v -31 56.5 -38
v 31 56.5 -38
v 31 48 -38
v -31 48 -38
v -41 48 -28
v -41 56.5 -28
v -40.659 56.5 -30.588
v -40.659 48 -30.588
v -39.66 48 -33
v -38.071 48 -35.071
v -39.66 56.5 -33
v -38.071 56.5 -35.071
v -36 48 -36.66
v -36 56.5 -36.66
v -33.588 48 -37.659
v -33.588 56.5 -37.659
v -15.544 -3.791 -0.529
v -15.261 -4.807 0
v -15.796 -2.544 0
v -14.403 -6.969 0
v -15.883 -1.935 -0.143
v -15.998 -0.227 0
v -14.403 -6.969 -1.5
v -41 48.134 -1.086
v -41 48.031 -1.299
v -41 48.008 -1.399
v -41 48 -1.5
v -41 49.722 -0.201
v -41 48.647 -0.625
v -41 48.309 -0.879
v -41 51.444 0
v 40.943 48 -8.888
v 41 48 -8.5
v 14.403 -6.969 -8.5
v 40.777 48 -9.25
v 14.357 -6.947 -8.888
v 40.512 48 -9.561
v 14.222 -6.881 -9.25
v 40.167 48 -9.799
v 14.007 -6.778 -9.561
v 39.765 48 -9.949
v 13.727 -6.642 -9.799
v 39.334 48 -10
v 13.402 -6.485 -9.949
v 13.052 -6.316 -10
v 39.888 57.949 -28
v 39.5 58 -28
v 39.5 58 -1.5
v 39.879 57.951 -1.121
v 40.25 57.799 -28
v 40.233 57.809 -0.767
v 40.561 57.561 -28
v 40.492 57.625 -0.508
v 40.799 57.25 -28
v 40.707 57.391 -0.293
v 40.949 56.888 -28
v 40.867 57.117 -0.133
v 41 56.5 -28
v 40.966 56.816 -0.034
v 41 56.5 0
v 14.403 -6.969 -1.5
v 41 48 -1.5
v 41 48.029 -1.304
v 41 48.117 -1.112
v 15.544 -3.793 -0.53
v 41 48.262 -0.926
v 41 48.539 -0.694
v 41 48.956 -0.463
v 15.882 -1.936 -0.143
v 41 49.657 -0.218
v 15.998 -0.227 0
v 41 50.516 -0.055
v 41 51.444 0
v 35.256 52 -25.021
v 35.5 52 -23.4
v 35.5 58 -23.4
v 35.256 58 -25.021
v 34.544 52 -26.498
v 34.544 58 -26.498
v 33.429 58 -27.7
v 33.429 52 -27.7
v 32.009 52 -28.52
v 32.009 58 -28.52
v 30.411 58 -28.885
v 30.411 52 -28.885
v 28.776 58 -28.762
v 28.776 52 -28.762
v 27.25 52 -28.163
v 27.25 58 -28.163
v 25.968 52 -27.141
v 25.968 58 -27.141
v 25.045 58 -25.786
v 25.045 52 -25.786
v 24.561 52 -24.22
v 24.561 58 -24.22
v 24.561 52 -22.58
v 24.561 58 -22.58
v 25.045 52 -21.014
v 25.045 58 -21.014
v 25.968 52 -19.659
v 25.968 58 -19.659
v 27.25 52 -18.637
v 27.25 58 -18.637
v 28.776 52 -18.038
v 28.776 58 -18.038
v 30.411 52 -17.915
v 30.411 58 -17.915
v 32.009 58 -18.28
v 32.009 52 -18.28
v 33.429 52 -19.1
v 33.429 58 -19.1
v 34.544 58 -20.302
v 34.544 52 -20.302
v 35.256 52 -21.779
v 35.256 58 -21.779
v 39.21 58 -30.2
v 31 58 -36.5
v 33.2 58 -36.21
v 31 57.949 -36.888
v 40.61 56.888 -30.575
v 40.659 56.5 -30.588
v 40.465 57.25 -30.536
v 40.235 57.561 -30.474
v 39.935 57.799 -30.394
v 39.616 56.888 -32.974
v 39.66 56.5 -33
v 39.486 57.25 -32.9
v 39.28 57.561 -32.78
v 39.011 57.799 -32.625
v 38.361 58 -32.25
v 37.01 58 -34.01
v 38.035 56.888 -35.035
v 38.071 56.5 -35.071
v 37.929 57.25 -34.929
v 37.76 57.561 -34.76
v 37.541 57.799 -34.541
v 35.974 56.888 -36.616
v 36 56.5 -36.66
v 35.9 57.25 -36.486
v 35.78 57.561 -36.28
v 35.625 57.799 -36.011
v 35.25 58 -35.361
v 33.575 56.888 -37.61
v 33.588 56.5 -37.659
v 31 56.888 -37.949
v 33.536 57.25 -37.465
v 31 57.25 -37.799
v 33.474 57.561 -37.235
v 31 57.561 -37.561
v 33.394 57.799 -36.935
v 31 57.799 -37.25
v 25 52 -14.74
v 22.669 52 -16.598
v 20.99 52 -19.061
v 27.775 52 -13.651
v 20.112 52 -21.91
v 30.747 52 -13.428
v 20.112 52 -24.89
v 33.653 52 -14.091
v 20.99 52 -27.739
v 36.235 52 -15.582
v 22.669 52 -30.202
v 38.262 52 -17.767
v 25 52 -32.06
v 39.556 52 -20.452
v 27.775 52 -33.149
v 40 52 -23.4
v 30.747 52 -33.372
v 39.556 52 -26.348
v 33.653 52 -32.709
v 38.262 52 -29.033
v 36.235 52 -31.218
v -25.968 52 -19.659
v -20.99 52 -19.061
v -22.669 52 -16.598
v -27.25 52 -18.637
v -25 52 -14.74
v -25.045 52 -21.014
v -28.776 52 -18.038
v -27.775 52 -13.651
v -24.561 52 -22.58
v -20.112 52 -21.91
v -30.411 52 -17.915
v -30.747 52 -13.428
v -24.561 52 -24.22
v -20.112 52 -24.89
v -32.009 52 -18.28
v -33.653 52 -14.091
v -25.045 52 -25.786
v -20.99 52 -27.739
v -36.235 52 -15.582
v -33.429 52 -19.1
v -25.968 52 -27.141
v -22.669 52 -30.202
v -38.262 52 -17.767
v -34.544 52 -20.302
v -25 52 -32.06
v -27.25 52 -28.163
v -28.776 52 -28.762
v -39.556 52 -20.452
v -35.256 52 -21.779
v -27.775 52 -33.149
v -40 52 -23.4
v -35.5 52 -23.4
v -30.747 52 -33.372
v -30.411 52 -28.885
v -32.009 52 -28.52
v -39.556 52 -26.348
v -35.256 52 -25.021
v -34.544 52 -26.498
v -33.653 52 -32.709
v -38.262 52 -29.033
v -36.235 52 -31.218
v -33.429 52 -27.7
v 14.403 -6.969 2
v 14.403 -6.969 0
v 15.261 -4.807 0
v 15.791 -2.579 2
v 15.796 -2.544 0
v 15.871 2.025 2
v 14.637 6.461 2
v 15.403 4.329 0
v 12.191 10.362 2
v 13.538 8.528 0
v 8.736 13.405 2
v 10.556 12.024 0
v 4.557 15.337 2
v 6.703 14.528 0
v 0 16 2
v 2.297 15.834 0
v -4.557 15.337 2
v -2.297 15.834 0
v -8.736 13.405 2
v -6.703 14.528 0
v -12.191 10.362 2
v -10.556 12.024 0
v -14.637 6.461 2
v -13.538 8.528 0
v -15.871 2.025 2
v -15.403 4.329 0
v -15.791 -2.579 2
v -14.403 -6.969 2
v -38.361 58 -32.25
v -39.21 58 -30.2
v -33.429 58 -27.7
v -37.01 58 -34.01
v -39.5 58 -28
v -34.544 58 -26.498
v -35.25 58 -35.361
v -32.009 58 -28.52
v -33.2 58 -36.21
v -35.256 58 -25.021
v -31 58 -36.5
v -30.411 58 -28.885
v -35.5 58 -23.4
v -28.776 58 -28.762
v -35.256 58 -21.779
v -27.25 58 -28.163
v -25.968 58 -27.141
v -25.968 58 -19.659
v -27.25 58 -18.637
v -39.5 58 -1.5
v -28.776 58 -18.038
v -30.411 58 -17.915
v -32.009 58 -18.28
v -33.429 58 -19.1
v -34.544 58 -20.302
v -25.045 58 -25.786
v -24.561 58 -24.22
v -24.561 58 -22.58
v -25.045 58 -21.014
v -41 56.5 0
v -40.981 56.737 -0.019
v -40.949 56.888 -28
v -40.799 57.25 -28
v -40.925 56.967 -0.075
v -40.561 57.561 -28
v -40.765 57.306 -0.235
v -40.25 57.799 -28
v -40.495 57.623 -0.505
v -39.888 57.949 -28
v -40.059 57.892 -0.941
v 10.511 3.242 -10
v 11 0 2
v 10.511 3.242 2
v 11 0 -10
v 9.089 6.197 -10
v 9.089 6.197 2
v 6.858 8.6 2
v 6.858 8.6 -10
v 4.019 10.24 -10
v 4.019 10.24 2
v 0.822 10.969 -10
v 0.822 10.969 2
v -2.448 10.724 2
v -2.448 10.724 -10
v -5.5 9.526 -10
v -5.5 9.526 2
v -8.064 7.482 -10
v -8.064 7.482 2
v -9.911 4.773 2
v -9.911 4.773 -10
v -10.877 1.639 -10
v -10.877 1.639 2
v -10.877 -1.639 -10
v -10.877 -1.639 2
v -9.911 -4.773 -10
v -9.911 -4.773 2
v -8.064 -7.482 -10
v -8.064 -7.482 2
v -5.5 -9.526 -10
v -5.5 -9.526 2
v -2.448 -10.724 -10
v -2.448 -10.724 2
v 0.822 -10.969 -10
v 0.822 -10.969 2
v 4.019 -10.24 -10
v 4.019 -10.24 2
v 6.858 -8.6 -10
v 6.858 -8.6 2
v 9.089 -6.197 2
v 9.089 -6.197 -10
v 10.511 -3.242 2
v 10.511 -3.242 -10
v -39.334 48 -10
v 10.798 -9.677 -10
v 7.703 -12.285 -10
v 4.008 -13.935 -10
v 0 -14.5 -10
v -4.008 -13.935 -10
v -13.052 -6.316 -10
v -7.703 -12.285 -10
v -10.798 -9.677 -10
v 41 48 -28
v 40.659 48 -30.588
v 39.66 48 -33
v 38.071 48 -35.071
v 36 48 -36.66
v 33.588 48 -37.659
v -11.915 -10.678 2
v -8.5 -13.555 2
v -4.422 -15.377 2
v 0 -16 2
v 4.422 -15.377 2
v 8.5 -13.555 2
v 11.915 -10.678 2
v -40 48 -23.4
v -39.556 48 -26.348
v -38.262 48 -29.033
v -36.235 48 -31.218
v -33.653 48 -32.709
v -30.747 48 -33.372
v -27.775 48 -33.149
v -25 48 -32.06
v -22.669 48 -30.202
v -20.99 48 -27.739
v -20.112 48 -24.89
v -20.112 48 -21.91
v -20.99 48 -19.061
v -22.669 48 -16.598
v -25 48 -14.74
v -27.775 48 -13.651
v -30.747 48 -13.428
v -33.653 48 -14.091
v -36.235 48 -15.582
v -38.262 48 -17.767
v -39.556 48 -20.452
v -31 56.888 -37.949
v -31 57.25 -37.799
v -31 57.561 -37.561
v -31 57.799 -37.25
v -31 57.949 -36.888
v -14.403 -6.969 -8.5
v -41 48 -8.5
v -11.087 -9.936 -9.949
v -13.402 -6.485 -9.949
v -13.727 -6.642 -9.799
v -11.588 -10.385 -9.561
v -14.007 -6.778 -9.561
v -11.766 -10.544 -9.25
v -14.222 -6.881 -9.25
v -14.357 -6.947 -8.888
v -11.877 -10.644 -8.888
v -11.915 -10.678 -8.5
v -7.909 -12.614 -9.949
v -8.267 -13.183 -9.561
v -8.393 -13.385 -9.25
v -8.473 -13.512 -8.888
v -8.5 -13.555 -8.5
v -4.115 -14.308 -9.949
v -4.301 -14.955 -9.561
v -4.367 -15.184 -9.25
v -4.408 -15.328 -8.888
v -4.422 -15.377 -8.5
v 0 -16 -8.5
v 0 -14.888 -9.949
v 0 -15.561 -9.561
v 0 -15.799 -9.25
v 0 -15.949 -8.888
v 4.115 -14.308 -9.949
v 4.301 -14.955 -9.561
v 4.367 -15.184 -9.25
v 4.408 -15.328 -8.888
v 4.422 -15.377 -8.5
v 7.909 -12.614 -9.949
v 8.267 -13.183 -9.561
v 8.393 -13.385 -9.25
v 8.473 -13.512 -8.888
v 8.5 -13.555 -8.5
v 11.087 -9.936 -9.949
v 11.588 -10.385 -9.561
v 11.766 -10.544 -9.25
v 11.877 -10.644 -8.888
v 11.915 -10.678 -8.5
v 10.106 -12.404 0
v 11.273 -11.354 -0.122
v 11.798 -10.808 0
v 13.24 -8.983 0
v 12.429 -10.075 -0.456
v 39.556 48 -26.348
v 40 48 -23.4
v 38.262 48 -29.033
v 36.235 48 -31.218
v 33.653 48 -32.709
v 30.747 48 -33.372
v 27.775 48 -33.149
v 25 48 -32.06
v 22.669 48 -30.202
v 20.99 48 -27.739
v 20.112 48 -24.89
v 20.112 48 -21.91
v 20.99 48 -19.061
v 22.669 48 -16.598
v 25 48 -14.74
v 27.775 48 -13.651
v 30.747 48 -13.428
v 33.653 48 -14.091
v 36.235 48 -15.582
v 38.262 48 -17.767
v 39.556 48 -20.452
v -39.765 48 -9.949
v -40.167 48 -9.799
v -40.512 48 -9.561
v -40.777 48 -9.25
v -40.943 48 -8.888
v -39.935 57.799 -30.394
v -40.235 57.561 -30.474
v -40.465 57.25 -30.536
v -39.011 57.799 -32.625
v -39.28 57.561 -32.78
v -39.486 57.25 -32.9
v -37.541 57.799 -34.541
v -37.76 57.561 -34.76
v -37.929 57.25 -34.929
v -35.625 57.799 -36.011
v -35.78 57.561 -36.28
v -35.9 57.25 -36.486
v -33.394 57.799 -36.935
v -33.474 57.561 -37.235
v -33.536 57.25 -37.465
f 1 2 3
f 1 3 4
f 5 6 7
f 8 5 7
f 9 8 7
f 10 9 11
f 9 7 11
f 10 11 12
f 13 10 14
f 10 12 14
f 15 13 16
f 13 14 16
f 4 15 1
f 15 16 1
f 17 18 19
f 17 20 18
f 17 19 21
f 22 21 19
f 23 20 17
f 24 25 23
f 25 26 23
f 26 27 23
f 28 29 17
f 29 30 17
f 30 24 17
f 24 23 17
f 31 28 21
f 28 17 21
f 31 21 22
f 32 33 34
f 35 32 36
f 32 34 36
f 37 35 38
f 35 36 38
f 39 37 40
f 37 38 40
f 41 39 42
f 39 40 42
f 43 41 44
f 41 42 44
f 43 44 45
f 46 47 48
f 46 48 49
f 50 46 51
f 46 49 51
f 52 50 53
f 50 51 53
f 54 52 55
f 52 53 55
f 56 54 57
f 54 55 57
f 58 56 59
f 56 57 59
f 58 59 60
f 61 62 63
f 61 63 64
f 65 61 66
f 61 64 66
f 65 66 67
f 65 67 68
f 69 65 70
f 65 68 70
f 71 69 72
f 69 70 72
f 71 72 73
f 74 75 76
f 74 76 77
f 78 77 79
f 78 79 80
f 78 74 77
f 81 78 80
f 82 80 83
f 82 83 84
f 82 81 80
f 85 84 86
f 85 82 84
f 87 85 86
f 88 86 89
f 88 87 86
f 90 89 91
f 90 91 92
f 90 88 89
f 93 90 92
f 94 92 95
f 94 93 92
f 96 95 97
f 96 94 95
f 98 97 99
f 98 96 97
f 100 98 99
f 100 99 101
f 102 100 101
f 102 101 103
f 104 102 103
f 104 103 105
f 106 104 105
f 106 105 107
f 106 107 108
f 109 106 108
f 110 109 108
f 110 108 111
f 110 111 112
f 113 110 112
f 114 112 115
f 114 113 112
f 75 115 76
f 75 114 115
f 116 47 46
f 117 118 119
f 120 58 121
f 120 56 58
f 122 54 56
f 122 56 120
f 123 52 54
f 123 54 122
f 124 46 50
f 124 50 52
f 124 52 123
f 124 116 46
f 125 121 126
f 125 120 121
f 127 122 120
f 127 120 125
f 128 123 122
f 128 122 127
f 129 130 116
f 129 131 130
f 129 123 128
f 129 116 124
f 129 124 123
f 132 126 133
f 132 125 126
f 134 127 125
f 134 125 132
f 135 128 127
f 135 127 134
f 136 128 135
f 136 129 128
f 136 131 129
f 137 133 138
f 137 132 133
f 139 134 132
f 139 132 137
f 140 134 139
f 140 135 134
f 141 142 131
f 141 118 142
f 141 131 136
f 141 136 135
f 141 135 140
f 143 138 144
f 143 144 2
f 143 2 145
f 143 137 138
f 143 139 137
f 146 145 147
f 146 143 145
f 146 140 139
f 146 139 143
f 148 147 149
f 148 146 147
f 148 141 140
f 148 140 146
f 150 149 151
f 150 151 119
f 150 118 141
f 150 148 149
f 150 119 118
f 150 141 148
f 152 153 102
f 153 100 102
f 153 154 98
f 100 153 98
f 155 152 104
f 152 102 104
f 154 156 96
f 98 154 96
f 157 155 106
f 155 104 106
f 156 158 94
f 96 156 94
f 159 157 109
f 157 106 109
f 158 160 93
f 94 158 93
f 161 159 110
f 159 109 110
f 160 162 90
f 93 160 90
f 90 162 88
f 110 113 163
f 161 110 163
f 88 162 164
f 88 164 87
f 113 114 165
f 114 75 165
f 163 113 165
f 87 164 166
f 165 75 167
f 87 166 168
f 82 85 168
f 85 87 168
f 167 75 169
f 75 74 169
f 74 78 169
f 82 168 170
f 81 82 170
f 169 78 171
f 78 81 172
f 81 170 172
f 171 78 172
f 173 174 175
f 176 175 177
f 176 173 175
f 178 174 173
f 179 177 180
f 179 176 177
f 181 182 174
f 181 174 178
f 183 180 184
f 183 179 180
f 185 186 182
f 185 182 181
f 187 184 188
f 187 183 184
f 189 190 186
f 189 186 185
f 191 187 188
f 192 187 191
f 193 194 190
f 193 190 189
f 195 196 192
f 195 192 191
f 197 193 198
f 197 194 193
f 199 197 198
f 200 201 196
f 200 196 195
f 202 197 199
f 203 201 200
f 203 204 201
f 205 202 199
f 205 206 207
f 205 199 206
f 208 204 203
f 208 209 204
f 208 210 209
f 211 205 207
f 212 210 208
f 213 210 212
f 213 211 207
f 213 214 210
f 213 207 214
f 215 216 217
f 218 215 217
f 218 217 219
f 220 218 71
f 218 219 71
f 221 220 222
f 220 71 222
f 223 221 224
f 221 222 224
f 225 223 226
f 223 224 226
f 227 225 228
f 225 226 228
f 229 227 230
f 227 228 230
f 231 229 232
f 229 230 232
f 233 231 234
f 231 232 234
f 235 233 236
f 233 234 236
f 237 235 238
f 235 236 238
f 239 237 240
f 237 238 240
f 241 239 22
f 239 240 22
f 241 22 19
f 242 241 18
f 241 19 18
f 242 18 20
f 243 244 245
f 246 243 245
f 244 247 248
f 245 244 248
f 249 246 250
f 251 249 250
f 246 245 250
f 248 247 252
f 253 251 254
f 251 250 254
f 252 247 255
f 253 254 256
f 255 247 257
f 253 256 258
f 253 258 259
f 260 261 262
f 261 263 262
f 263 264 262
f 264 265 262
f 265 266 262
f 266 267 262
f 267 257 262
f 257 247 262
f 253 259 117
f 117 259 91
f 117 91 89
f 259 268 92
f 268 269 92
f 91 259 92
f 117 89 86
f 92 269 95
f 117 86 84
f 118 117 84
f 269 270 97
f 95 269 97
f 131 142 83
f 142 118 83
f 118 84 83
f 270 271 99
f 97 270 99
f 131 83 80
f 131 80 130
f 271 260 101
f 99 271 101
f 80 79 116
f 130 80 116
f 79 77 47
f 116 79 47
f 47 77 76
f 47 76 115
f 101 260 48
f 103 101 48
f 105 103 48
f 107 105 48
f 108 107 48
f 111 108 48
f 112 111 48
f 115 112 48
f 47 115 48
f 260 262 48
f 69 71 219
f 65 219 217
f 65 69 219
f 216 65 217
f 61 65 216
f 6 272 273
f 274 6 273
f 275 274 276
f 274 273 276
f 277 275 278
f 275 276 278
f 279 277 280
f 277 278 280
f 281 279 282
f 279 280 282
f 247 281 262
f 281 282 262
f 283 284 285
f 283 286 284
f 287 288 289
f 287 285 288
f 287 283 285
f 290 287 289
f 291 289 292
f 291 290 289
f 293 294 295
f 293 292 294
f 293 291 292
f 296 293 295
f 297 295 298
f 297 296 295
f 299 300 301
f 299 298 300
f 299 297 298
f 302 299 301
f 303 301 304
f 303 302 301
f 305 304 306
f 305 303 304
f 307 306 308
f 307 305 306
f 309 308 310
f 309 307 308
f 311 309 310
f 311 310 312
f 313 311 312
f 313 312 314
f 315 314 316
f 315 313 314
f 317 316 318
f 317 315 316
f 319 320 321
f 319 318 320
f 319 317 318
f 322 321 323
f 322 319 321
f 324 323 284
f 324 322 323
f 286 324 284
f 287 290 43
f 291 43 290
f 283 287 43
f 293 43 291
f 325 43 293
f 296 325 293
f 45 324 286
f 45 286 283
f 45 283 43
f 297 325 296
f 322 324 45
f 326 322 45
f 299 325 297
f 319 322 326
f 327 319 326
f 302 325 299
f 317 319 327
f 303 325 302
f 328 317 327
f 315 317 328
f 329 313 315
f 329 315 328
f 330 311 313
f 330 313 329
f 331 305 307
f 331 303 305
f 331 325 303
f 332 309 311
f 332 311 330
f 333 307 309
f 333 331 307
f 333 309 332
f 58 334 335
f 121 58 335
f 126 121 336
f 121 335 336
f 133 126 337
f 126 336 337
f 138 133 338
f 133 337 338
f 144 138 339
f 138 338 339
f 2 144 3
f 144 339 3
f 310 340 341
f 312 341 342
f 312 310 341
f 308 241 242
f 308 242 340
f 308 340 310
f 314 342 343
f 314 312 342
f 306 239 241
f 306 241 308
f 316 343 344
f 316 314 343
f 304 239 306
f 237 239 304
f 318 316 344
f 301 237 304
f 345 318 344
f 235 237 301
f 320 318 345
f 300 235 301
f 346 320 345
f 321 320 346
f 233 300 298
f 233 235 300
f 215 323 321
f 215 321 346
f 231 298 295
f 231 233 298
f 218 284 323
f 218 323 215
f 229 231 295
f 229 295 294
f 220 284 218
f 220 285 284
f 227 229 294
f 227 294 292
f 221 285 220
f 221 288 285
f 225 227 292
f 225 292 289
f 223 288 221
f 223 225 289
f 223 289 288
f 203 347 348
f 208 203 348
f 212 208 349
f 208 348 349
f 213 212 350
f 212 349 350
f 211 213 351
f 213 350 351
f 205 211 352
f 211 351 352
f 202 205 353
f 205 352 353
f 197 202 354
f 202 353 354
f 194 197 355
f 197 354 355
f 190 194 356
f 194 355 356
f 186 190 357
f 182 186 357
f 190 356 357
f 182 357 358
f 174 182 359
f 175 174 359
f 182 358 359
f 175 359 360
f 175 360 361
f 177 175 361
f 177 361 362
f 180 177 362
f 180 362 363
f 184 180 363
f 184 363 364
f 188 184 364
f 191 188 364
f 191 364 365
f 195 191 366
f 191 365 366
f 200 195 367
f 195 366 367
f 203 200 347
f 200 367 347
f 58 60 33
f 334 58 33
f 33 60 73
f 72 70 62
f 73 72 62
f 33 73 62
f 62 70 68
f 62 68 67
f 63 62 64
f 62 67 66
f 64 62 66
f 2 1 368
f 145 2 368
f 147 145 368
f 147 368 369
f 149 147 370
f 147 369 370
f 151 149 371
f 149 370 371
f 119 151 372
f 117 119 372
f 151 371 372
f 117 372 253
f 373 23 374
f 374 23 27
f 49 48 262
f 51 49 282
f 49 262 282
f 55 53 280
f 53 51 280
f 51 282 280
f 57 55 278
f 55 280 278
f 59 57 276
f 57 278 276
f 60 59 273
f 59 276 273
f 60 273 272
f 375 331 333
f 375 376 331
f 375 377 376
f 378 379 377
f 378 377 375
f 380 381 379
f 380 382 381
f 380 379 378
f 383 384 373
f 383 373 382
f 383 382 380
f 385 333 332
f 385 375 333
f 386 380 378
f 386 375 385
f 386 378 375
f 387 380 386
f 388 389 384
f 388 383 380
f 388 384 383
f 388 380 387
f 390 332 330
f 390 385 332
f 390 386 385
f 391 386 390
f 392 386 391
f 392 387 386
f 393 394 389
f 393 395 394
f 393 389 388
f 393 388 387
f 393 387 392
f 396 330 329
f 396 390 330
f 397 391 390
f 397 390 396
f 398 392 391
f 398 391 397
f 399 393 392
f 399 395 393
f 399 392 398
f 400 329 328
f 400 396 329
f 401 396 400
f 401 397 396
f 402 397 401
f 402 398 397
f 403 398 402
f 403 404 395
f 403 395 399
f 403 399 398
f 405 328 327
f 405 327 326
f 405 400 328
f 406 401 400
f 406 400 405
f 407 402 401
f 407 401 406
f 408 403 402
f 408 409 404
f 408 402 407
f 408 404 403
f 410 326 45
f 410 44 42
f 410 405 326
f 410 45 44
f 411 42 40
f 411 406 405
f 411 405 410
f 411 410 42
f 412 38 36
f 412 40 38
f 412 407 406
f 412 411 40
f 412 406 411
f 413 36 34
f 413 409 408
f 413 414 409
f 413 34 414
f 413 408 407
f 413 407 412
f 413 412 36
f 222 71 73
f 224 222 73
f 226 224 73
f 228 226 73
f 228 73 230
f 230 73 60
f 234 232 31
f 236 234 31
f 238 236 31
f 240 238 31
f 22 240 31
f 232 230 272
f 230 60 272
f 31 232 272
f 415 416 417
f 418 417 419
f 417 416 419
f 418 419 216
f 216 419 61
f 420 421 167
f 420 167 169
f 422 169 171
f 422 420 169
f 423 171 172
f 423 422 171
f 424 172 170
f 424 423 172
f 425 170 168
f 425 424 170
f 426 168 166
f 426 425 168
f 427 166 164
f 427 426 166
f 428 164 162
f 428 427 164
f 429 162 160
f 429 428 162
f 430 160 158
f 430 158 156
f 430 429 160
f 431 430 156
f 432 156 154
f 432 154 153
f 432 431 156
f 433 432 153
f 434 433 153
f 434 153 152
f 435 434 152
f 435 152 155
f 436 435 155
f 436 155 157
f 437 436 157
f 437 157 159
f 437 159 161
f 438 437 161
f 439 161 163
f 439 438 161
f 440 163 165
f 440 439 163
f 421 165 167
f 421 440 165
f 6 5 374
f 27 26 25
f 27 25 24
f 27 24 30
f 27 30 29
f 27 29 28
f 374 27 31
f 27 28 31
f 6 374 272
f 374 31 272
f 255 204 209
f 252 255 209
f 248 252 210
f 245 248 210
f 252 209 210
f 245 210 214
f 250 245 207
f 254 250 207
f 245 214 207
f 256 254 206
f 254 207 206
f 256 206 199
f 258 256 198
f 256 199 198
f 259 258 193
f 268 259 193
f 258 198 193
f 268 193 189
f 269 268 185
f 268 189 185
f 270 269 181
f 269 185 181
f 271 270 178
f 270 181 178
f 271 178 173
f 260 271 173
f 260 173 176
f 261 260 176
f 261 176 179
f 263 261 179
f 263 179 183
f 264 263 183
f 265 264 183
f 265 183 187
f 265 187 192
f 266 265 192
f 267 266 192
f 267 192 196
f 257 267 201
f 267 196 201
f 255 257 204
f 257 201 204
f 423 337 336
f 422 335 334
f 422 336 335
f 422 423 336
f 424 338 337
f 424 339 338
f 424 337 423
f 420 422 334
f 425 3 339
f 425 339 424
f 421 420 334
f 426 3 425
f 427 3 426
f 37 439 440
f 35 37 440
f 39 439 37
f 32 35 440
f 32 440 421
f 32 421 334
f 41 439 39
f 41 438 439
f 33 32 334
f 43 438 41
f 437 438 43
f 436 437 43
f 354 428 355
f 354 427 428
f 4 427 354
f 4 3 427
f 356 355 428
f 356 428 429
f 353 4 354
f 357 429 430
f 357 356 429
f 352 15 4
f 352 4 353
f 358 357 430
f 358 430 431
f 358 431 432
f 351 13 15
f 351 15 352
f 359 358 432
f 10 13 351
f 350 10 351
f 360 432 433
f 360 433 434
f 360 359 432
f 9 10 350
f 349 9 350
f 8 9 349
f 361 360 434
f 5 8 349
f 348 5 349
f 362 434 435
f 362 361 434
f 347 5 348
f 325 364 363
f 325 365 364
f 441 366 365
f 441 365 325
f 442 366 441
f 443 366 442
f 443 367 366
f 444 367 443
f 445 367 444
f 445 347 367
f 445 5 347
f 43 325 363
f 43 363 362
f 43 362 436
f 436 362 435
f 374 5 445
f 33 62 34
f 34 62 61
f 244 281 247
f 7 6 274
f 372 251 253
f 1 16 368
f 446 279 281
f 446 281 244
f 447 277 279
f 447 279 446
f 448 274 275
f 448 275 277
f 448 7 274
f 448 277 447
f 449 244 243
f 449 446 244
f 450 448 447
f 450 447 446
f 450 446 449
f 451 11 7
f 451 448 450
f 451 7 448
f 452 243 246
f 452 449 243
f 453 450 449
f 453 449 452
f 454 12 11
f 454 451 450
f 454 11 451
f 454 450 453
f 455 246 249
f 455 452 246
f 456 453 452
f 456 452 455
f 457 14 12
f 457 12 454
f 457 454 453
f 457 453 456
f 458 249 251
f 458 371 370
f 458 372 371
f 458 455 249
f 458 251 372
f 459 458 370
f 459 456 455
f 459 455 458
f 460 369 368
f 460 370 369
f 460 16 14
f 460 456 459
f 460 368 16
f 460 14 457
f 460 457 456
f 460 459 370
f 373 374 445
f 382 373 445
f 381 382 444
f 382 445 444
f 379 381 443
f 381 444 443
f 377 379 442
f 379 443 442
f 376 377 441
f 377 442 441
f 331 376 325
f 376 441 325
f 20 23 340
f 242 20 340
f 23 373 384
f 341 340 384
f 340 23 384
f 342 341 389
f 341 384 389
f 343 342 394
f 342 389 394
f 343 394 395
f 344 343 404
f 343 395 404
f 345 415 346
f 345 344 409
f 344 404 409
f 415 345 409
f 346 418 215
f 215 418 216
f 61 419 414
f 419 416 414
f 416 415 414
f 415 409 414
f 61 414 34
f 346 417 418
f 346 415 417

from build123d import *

# Parameters (mm, degrees)
BASE_EXTRUDE_DEPTH      = 38
CUT_EXTRUDE1_DEPTH      = 81.554329493
CUT_EXTRUDE1_DEPTH_BACK = 41
HOLE2_OUTLINE_R         = 11
HOLE2_DEPTH             = 2
HOLE2_START             = -10
HOLE2_2_OUTLINE_R       = 11
HOLE2_2_DEPTH           = 10
HOLE2_START_2           = 48
HOLE2_3_OUTLINE_R       = 10
HOLE2_3_DEPTH           = 4
HOLE2_START_3           = 52
HOLE2_4_OUTLINE_R       = 5.5
HOLE2_4_DEPTH           = 6
FILLET1_R               = 10
FILLET7_R               = 1.5


with BuildPart() as part:
    # Sketch2 → Base-Extrude (new body)
    with BuildSketch(Plane.XY):
        with BuildLine():
            Line((-14.402593128, -6.96888163), (-41, 48))
            Line((-41, 48), (-41, 58))
            Line((-41, 58), (41, 58))
            Line((41, 58), (41, 48))
            Line((41, 48), (14.402593128, -6.96888163))
            ThreePointArc((14.402593128, -6.96888163), (0, -16), (-14.402593128, -6.96888163))
        make_face()
    extrude(amount=-BASE_EXTRUDE_DEPTH)

    # Sketch3 → Cut-Extrude1 (cut, two sides: drawn at the far end of the back side and taken through both)
    with BuildSketch(Plane(origin=(0, 0, 0), x_dir=(0, 0, -1), z_dir=(1, 0, 0)).offset(-CUT_EXTRUDE1_DEPTH_BACK)):
        Polygon((10, -250.492798217), (10, -38.853504021), (10, 48), (38, 48), (249.639294197, 48), (579.708021452, -216.989431263), (340.068727255, -515.482229481), align=None)
    extrude(amount=CUT_EXTRUDE1_DEPTH + CUT_EXTRUDE1_DEPTH_BACK, mode=Mode.SUBTRACT)

    # Hole2: read off the stored shape, not the designer's step
    # Hole2 outline → Hole2 (add)
    with BuildSketch(Plane.XY):
        with BuildLine():
            ThreePointArc((14.402593128, -6.96888163), (0, 16), (-14.402593128, -6.96888163))
            ThreePointArc((-14.402593128, -6.96888163), (0, -16), (14.402593128, -6.96888163))
        make_face()
        Circle(HOLE2_OUTLINE_R, mode=Mode.SUBTRACT)
    hole2 = extrude(amount=HOLE2_DEPTH)

    # Hole2 2 outline → Hole2 2 (cut)
    with BuildSketch(Plane.XY.offset(HOLE2_START)):
        Circle(HOLE2_2_OUTLINE_R)
    hole2_2 = extrude(amount=HOLE2_2_DEPTH, mode=Mode.SUBTRACT)

    # Hole2 3 outline → Hole2 3 (cut)
    with BuildSketch(Plane(origin=(0, 0, 0), x_dir=(1, 0, 0), z_dir=(0, 1, 0)).offset(HOLE2_START_2)):
        with Locations((30, 23.4)):
            Circle(HOLE2_3_OUTLINE_R)
    hole2_3 = extrude(amount=HOLE2_3_DEPTH, mode=Mode.SUBTRACT)

    # Hole2 4 outline → Hole2 4 (cut)
    with BuildSketch(Plane(origin=(0, 0, 0), x_dir=(1, 0, 0), z_dir=(0, 1, 0)).offset(HOLE2_START_3)):
        with Locations((30, 23.4)):
            Circle(HOLE2_4_OUTLINE_R)
    hole2_4 = extrude(amount=HOLE2_4_DEPTH, mode=Mode.SUBTRACT)

    # Mirror1: Hole2, Hole2 2, Hole2 3, Hole2 4 across plane
    add(hole2.mirror(Plane(origin=(0, 0, 0), x_dir=(0, 0, 1), z_dir=(1, 0, 0))))
    add(hole2_2.mirror(Plane(origin=(0, 0, 0), x_dir=(0, 0, 1), z_dir=(1, 0, 0))), mode=Mode.SUBTRACT)
    add(hole2_3.mirror(Plane(origin=(0, 0, 0), x_dir=(0, 0, 1), z_dir=(1, 0, 0))), mode=Mode.SUBTRACT)
    add(hole2_4.mirror(Plane(origin=(0, 0, 0), x_dir=(0, 0, 1), z_dir=(1, 0, 0))), mode=Mode.SUBTRACT)

    # Fillet1
    fillet1_edges = [part.edges().sort_by_distance(p)[0] for p in [
        (41, 53, -38),
        (-41, 53, -38),
    ]]
    fillet(fillet1_edges, radius=FILLET1_R)

    # Fillet7
    # the kernel refuses this fillet: 1.5 mm, written as the material it takes off along each edge
    with BuildSketch(Plane(origin=(14.402593128, -6.96888163, -10), x_dir=(-0.9001620705215131, 0.43555510190379193, 0), z_dir=(0.435555101903792, 0.9001620705215131, 0))) as fillet7_piece_1_section:
        with BuildLine():
            CenterArc((FILLET7_R, FILLET7_R), FILLET7_R, 180, 90)
            Line((0, FILLET7_R), (0, 0))
            Line((0, 0), (FILLET7_R, 0))
        make_face()
    fillet7_piece_1 = extrude(amount=64.815538563, mode=Mode.PRIVATE)
    fillet7_piece_1 = split(fillet7_piece_1, bisect_by=Plane(origin=(14.402593128, 48, -10), z_dir=(0, -1, 0)), keep=Keep.TOP, mode=Mode.PRIVATE)
    add(fillet7_piece_1, mode=Mode.SUBTRACT)
    with BuildSketch(Plane(origin=(0, 0, -10), x_dir=(-0.9001620705215129, -0.4355551019037922, 0), z_dir=(-0.4355551019037922, 0.9001620705215129, 0))) as fillet7_piece_2:
        with BuildLine():
            CenterArc((16 - FILLET7_R, FILLET7_R), FILLET7_R, 270, 90)
            Line((16, FILLET7_R), (16, 0))
            Line((16, 0), (16 - FILLET7_R, 0))
        make_face()
    revolve(axis=Axis((0, 0, -10), (0, 0, 1)), revolution_arc=128.358757734, mode=Mode.SUBTRACT)
    with BuildSketch(Plane(origin=(-42.633331632, 51.375607764, -10), x_dir=(0, 0, 1), z_dir=(0.4355551019037922, -0.900162070521513, 0))) as fillet7_piece_3_section:
        with BuildLine():
            CenterArc((FILLET7_R, -FILLET7_R), FILLET7_R, 90, 90)
            Line((0, -FILLET7_R), (0, 0))
            Line((0, 0), (FILLET7_R, 0))
        make_face()
    fillet7_piece_3 = extrude(amount=64.815538563, mode=Mode.PRIVATE)
    fillet7_piece_3 = split(fillet7_piece_3, bisect_by=Plane(origin=(-42.633331632, 48, -10), z_dir=(0, -1, 0)), keep=Keep.TOP, mode=Mode.PRIVATE)
    add(fillet7_piece_3, mode=Mode.SUBTRACT)
    with BuildSketch(Plane(origin=(-31, 58, -38), x_dir=(0, 0, 1), z_dir=(1, 0, 0))) as fillet7_piece_4:
        with BuildLine():
            CenterArc((FILLET7_R, FILLET7_R), FILLET7_R, 180, 90)
            Line((0, FILLET7_R), (0, 0))
            Line((0, 0), (FILLET7_R, 0))
        make_face()
    extrude(amount=62, mode=Mode.SUBTRACT)
    with BuildSketch(Plane(origin=(41, 58, 3.75), x_dir=(-1, 0, 0), z_dir=(0, 0, -1)), Plane(origin=(-41, 58, 3.75), x_dir=(0, -1, 0), z_dir=(0, 0, -1))) as fillet7_piece_5:
        with BuildLine():
            CenterArc((FILLET7_R, -FILLET7_R), FILLET7_R, 90, 90)
            Line((0, -FILLET7_R), (0, 0))
            Line((0, 0), (FILLET7_R, 0))
        make_face()
    extrude(amount=31.75, mode=Mode.SUBTRACT)
    with BuildSketch(Plane(origin=(31, 58, -28), x_dir=(1, 0, 0), z_dir=(0, 0, 1))) as fillet7_piece_6:
        with BuildLine():
            CenterArc((10 - FILLET7_R, -FILLET7_R), FILLET7_R, 360, 90)
            Line((10, -FILLET7_R), (10, 0))
            Line((10, 0), (10 - FILLET7_R, 0))
        make_face()
    revolve(axis=Axis((31, 58, -28), (0, 1, 0)), revolution_arc=90, mode=Mode.SUBTRACT)
    with BuildSketch(Plane(origin=(-31, 58, -28), x_dir=(-1, 0, 0), z_dir=(0, 0, 1))) as fillet7_piece_7:
        with BuildLine():
            CenterArc((10 - FILLET7_R, FILLET7_R), FILLET7_R, 270, 90)
            Line((10 - FILLET7_R, 0), (10, 0))
            Line((10, 0), (10, FILLET7_R))
        make_face()
    revolve(axis=Axis((-31, 58, -28), (0, -1, 0)), revolution_arc=90, mode=Mode.SUBTRACT)
    with BuildSketch(Plane(origin=(-9.502598232, -17.095704924, 0), x_dir=(0, 0, -1), z_dir=(-0.4355551019037922, 0.900162070521513, 0))) as fillet7_piece_8_section:
        with BuildLine():
            CenterArc((FILLET7_R, -FILLET7_R), FILLET7_R, 90, 90)
            Line((0, -FILLET7_R), (0, 0))
            Line((0, 0), (FILLET7_R, 0))
        make_face()
    fillet7_piece_8 = extrude(amount=76.065538563, mode=Mode.PRIVATE)
    fillet7_piece_8 = fillet7_piece_8 - Plane(origin=(0, 0, 0), x_dir=(0.9001620705200065, -0.4355551019069058, 0), z_dir=(0, 0, -1)) * Cylinder(16, 159, mode=Mode.PRIVATE)
    add(fillet7_piece_8, mode=Mode.SUBTRACT)
    with BuildSketch(Plane(origin=(-44.75, 58, 0), x_dir=(0, 0, -1), z_dir=(1, 0, 0))) as fillet7_piece_9:
        with BuildLine():
            CenterArc((FILLET7_R, -FILLET7_R), FILLET7_R, 90, 90)
            Line((0, -FILLET7_R), (0, 0))
            Line((0, 0), (FILLET7_R, 0))
        make_face()
    extrude(amount=89.5, mode=Mode.SUBTRACT)
    with BuildSketch(Plane(origin=(42.633331632, 51.375607764, 0), x_dir=(-0.900162070521513, 0.4355551019037919, 0), z_dir=(-0.435555101903792, -0.9001620705215131, 0))) as fillet7_piece_10_section:
        with BuildLine():
            CenterArc((FILLET7_R, FILLET7_R), FILLET7_R, 180, 90)
            Line((0, FILLET7_R), (0, 0))
            Line((0, 0), (FILLET7_R, 0))
        make_face()
    fillet7_piece_10 = extrude(amount=76.065538563, mode=Mode.PRIVATE)
    fillet7_piece_10 = fillet7_piece_10 - Plane(origin=(0, 0, 0), x_dir=(0.9001620705200065, -0.4355551019069058, 0), z_dir=(0, 0, -1)) * Cylinder(16, 159, mode=Mode.PRIVATE)
    add(fillet7_piece_10, mode=Mode.SUBTRACT)


solid = part.part
